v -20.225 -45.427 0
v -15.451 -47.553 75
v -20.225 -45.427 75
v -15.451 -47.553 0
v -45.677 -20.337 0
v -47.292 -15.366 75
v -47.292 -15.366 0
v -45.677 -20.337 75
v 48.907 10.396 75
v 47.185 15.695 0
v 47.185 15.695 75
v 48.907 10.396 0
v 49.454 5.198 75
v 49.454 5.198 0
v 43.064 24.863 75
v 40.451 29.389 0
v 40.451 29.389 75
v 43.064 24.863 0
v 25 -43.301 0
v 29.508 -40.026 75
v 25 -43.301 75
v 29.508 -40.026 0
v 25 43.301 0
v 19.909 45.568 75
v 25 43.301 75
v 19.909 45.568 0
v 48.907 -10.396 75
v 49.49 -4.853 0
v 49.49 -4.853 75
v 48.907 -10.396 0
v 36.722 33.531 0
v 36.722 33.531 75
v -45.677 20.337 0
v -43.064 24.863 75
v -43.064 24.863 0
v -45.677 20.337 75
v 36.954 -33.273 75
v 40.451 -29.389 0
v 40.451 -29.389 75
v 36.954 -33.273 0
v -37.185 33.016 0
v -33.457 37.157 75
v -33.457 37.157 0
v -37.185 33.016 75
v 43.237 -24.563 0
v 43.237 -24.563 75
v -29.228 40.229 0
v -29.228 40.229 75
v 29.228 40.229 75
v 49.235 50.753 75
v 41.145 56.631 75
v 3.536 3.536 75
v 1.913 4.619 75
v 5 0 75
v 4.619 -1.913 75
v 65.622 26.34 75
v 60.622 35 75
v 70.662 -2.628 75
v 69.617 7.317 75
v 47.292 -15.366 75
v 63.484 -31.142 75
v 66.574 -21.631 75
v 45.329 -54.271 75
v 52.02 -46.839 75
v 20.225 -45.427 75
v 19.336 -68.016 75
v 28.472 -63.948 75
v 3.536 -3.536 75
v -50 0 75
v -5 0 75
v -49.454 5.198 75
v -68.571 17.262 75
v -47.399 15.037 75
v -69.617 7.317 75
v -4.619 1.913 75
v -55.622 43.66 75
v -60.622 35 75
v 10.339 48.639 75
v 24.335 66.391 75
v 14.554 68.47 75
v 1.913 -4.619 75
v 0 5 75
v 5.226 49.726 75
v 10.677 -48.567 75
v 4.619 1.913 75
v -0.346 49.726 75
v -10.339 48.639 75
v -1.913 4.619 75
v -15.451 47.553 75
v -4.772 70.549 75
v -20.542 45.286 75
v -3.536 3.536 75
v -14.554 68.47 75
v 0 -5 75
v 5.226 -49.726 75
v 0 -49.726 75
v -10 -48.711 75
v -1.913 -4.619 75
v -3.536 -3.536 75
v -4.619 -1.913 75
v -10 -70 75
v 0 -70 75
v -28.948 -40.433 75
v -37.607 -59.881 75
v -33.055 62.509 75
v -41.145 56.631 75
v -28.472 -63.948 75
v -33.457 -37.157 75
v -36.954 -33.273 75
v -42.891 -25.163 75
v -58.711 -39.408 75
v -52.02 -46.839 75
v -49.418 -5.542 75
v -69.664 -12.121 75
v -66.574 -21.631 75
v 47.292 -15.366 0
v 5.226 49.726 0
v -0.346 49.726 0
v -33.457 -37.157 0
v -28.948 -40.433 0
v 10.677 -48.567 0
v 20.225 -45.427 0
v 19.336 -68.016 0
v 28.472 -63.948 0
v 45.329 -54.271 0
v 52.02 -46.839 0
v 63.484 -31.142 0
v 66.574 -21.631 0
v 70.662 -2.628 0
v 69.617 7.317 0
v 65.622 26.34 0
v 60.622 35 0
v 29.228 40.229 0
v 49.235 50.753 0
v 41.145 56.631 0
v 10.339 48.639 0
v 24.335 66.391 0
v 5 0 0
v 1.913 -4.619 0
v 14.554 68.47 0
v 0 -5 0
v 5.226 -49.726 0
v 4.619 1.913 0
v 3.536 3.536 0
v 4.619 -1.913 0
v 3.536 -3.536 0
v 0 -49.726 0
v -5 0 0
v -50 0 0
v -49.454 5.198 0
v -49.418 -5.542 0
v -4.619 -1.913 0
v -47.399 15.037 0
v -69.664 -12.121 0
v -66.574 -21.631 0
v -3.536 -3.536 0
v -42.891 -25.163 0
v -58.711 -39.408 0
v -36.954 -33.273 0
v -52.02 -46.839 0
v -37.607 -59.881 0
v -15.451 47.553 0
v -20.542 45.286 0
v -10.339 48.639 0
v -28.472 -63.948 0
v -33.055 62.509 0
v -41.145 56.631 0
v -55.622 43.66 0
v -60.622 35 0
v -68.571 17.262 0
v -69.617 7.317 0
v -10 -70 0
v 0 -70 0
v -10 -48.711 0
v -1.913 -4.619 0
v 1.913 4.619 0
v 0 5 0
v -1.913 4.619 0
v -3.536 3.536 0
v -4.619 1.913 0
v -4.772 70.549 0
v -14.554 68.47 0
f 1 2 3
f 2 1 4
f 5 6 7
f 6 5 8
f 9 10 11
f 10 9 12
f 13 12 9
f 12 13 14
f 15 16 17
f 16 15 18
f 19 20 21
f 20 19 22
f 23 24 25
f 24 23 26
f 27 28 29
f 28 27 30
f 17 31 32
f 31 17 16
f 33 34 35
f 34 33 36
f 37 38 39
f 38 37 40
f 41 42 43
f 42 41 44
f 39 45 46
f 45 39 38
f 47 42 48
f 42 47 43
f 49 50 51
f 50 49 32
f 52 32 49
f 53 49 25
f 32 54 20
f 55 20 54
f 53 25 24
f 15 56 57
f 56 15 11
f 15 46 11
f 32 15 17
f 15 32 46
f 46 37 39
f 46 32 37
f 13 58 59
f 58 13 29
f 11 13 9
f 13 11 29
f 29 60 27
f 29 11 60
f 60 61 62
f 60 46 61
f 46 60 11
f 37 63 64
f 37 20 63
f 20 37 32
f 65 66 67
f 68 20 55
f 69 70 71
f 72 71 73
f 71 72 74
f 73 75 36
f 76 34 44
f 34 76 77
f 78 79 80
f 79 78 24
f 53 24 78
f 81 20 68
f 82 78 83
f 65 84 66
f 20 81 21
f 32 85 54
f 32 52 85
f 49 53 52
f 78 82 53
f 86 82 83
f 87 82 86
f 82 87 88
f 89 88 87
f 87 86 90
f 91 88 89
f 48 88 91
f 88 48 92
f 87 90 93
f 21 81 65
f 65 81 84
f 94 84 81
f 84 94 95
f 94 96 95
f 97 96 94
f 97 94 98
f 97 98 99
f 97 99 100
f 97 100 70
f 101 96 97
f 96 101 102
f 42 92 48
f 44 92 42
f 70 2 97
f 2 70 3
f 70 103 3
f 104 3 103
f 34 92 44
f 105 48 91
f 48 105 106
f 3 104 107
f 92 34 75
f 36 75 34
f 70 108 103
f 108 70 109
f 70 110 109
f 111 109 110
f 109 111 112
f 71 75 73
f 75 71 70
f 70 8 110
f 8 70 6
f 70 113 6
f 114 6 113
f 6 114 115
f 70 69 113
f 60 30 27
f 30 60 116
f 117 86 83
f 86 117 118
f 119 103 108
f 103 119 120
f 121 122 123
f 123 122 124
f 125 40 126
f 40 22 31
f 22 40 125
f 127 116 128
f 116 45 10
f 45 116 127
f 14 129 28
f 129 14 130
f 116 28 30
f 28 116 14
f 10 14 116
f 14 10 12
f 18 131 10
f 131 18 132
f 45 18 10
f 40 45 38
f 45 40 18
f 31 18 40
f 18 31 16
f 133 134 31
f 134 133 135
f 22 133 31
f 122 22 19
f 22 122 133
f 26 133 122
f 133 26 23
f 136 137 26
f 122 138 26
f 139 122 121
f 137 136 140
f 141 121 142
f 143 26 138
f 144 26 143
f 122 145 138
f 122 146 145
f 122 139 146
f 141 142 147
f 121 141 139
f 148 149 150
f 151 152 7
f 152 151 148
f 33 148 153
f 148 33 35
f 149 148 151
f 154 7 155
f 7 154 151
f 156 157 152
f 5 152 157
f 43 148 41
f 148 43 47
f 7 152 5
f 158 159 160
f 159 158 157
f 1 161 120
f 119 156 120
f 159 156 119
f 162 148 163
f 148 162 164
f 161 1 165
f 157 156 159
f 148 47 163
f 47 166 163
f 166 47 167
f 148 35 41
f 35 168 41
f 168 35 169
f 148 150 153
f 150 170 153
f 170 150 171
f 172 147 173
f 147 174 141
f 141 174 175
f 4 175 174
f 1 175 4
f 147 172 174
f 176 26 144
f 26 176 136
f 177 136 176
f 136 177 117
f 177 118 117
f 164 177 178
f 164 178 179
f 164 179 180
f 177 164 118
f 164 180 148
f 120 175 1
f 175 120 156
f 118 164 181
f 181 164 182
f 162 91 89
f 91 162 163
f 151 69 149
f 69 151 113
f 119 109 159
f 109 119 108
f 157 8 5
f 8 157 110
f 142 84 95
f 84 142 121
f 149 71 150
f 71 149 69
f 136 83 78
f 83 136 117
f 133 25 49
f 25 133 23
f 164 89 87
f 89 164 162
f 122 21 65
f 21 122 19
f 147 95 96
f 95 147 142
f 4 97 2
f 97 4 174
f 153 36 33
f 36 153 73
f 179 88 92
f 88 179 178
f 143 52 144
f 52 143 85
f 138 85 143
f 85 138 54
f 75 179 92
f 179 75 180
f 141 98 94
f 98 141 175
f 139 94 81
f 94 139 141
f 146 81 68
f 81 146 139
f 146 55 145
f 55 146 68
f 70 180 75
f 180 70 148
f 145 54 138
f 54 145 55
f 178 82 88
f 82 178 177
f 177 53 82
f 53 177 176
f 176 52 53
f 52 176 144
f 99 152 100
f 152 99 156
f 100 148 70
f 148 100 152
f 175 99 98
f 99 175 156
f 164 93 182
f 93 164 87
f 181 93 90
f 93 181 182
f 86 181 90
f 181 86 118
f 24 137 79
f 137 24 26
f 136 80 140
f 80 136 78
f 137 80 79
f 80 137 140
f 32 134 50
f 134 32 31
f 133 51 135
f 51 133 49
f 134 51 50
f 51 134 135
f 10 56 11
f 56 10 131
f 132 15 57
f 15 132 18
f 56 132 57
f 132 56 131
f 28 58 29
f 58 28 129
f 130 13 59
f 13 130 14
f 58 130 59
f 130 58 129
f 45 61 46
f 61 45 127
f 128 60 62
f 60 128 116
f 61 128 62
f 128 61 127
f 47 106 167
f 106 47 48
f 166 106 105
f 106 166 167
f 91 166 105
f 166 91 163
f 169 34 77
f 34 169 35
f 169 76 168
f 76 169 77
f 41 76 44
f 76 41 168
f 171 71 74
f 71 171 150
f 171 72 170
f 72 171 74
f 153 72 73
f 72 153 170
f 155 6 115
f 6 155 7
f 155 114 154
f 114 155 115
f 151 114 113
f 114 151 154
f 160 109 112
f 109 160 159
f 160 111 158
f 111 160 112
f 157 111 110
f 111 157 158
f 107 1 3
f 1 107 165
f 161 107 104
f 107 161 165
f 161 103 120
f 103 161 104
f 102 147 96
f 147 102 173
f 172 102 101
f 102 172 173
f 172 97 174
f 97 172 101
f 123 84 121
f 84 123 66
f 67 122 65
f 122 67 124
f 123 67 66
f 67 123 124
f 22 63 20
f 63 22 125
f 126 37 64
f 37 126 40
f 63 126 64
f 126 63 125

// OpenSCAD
// First Gear
// Meshes perfectly
// By Joey Hudy
// Joey@LookWhatJoeysMaking.Com
// 2011-06-14 First version


difference(){ 

cylinder(h=75,r=50);

translate([0,0,-3])

cylinder(h=80,r=5);

}

rotate([0,0,12])

translate([0,45,0]) 

cube([10,25,75]);

rotate([0,0,-12,])

translate([0,45,0]) 

cube([10,25,75]);

rotate([0,0,-36,])

translate([0,45,0]) 

cube([10,25,75]);

rotate([0,0,-60,])

translate([0,45,0]) 

cube([10,25,75]);

rotate([0,0,-84,])

translate([0,45,0]) 

cube([10,25,75]);

rotate([0,0,-108,])

translate([0,45,0]) 

cube([10,25,75]);

rotate([0,0,36,])

translate([0,45,0]) 

cube([10,25,75]);

rotate([0,0,60,])

translate([0,45,0]) 

cube([10,25,75]);

rotate([0,0,84,])

translate([0,45,0]) 

cube([10,25,75]);

rotate([0,0,108,])

translate([0,45,0]) 

cube([10,25,75]);

rotate([0,0,132,])

translate([0,45,0]) 

cube([10,25,75]);

rotate([0,0,156,])

translate([0,45,0]) 

cube([10,25,75]);

rotate([0,0,180,])

translate([0,45,0]) 

cube([10,25,75]);

rotate([0,0,204,])

translate([0,45,0]) 

cube([10,25,75]);

rotate([0,0,228,])

translate([0,45,0]) 

cube([10,25,75]);
